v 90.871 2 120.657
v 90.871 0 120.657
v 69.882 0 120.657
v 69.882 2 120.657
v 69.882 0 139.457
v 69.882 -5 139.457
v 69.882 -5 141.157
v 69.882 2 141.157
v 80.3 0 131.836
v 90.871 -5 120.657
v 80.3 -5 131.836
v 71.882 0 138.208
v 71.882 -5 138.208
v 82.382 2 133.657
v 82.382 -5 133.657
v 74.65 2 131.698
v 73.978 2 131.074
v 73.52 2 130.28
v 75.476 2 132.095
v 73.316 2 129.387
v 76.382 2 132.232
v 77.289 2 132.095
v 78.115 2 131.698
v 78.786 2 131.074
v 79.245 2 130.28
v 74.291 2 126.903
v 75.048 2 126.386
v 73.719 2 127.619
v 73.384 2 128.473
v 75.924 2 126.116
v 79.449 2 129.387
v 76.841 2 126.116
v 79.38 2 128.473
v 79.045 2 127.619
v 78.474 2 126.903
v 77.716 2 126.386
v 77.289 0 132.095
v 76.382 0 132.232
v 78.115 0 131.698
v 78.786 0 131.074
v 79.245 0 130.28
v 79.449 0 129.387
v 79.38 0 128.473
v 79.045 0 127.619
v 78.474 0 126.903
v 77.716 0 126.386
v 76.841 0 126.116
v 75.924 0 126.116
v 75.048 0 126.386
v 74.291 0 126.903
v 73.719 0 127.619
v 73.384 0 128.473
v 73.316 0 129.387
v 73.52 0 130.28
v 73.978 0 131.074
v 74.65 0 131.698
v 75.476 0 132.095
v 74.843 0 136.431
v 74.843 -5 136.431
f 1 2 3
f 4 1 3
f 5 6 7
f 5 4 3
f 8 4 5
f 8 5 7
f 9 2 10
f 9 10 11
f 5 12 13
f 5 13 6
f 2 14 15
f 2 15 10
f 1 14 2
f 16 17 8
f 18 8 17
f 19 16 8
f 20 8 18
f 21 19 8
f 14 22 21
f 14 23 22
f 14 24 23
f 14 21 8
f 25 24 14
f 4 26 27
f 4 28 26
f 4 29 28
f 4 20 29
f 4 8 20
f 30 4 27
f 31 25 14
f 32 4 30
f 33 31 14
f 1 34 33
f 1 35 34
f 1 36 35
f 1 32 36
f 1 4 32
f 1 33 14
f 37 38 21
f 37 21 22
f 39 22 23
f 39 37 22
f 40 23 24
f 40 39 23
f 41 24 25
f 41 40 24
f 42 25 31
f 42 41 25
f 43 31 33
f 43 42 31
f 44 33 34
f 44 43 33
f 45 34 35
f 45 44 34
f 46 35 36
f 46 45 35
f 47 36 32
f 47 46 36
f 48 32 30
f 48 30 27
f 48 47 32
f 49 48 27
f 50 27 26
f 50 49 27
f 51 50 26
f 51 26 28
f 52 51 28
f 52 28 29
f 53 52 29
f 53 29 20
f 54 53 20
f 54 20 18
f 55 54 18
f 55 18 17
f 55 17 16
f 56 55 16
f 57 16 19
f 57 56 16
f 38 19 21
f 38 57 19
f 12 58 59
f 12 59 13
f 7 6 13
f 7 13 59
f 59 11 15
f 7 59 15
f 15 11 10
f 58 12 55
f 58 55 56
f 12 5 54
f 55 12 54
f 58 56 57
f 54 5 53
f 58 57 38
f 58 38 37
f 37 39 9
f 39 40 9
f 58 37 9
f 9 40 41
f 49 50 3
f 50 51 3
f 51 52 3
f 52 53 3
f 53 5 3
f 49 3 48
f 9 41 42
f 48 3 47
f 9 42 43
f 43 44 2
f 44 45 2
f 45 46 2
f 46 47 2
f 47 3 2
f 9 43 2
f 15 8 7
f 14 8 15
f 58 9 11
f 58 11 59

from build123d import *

# Parameters (mm, degrees)
SKETCH1_R           = 3.075
BOSS_EXTRUDE1_DEPTH = 2
BOSS_EXTRUDE2_DEPTH = 5


with BuildPart() as part:
    # Sketch1 → Boss-Extrude1 (new body)
    with BuildSketch(Plane(origin=(0, 0, 0), x_dir=(1, 0, 0), z_dir=(0, 1, 0))):
        Polygon((69.882295615, -141.15690287), (82.382295615, -133.65690287), (90.871460172, -120.65690287), (69.882295615, -120.65690287), align=None)
        with Locations(Location((76.382295615, -129.15690287, 0), (0, 0, 270))):
            Circle(SKETCH1_R, mode=Mode.SUBTRACT)
    extrude(amount=BOSS_EXTRUDE1_DEPTH)

    # Sketch2 → Boss-Extrude2 (add)
    with BuildSketch(Plane(origin=(0, 0, 0), x_dir=(-1, 0, 0), z_dir=(0, -1, 0))):
        Polygon((-69.882295615, -141.15690287), (-82.382295615, -133.65690287), (-90.871460172, -120.65690287), (-80.30000632, -131.836011395), (-74.842574052, -136.43145024), (-71.882295615, -138.207617302), (-69.882295615, -139.45690287), align=None)
    extrude(amount=BOSS_EXTRUDE2_DEPTH)


solid = part.part
